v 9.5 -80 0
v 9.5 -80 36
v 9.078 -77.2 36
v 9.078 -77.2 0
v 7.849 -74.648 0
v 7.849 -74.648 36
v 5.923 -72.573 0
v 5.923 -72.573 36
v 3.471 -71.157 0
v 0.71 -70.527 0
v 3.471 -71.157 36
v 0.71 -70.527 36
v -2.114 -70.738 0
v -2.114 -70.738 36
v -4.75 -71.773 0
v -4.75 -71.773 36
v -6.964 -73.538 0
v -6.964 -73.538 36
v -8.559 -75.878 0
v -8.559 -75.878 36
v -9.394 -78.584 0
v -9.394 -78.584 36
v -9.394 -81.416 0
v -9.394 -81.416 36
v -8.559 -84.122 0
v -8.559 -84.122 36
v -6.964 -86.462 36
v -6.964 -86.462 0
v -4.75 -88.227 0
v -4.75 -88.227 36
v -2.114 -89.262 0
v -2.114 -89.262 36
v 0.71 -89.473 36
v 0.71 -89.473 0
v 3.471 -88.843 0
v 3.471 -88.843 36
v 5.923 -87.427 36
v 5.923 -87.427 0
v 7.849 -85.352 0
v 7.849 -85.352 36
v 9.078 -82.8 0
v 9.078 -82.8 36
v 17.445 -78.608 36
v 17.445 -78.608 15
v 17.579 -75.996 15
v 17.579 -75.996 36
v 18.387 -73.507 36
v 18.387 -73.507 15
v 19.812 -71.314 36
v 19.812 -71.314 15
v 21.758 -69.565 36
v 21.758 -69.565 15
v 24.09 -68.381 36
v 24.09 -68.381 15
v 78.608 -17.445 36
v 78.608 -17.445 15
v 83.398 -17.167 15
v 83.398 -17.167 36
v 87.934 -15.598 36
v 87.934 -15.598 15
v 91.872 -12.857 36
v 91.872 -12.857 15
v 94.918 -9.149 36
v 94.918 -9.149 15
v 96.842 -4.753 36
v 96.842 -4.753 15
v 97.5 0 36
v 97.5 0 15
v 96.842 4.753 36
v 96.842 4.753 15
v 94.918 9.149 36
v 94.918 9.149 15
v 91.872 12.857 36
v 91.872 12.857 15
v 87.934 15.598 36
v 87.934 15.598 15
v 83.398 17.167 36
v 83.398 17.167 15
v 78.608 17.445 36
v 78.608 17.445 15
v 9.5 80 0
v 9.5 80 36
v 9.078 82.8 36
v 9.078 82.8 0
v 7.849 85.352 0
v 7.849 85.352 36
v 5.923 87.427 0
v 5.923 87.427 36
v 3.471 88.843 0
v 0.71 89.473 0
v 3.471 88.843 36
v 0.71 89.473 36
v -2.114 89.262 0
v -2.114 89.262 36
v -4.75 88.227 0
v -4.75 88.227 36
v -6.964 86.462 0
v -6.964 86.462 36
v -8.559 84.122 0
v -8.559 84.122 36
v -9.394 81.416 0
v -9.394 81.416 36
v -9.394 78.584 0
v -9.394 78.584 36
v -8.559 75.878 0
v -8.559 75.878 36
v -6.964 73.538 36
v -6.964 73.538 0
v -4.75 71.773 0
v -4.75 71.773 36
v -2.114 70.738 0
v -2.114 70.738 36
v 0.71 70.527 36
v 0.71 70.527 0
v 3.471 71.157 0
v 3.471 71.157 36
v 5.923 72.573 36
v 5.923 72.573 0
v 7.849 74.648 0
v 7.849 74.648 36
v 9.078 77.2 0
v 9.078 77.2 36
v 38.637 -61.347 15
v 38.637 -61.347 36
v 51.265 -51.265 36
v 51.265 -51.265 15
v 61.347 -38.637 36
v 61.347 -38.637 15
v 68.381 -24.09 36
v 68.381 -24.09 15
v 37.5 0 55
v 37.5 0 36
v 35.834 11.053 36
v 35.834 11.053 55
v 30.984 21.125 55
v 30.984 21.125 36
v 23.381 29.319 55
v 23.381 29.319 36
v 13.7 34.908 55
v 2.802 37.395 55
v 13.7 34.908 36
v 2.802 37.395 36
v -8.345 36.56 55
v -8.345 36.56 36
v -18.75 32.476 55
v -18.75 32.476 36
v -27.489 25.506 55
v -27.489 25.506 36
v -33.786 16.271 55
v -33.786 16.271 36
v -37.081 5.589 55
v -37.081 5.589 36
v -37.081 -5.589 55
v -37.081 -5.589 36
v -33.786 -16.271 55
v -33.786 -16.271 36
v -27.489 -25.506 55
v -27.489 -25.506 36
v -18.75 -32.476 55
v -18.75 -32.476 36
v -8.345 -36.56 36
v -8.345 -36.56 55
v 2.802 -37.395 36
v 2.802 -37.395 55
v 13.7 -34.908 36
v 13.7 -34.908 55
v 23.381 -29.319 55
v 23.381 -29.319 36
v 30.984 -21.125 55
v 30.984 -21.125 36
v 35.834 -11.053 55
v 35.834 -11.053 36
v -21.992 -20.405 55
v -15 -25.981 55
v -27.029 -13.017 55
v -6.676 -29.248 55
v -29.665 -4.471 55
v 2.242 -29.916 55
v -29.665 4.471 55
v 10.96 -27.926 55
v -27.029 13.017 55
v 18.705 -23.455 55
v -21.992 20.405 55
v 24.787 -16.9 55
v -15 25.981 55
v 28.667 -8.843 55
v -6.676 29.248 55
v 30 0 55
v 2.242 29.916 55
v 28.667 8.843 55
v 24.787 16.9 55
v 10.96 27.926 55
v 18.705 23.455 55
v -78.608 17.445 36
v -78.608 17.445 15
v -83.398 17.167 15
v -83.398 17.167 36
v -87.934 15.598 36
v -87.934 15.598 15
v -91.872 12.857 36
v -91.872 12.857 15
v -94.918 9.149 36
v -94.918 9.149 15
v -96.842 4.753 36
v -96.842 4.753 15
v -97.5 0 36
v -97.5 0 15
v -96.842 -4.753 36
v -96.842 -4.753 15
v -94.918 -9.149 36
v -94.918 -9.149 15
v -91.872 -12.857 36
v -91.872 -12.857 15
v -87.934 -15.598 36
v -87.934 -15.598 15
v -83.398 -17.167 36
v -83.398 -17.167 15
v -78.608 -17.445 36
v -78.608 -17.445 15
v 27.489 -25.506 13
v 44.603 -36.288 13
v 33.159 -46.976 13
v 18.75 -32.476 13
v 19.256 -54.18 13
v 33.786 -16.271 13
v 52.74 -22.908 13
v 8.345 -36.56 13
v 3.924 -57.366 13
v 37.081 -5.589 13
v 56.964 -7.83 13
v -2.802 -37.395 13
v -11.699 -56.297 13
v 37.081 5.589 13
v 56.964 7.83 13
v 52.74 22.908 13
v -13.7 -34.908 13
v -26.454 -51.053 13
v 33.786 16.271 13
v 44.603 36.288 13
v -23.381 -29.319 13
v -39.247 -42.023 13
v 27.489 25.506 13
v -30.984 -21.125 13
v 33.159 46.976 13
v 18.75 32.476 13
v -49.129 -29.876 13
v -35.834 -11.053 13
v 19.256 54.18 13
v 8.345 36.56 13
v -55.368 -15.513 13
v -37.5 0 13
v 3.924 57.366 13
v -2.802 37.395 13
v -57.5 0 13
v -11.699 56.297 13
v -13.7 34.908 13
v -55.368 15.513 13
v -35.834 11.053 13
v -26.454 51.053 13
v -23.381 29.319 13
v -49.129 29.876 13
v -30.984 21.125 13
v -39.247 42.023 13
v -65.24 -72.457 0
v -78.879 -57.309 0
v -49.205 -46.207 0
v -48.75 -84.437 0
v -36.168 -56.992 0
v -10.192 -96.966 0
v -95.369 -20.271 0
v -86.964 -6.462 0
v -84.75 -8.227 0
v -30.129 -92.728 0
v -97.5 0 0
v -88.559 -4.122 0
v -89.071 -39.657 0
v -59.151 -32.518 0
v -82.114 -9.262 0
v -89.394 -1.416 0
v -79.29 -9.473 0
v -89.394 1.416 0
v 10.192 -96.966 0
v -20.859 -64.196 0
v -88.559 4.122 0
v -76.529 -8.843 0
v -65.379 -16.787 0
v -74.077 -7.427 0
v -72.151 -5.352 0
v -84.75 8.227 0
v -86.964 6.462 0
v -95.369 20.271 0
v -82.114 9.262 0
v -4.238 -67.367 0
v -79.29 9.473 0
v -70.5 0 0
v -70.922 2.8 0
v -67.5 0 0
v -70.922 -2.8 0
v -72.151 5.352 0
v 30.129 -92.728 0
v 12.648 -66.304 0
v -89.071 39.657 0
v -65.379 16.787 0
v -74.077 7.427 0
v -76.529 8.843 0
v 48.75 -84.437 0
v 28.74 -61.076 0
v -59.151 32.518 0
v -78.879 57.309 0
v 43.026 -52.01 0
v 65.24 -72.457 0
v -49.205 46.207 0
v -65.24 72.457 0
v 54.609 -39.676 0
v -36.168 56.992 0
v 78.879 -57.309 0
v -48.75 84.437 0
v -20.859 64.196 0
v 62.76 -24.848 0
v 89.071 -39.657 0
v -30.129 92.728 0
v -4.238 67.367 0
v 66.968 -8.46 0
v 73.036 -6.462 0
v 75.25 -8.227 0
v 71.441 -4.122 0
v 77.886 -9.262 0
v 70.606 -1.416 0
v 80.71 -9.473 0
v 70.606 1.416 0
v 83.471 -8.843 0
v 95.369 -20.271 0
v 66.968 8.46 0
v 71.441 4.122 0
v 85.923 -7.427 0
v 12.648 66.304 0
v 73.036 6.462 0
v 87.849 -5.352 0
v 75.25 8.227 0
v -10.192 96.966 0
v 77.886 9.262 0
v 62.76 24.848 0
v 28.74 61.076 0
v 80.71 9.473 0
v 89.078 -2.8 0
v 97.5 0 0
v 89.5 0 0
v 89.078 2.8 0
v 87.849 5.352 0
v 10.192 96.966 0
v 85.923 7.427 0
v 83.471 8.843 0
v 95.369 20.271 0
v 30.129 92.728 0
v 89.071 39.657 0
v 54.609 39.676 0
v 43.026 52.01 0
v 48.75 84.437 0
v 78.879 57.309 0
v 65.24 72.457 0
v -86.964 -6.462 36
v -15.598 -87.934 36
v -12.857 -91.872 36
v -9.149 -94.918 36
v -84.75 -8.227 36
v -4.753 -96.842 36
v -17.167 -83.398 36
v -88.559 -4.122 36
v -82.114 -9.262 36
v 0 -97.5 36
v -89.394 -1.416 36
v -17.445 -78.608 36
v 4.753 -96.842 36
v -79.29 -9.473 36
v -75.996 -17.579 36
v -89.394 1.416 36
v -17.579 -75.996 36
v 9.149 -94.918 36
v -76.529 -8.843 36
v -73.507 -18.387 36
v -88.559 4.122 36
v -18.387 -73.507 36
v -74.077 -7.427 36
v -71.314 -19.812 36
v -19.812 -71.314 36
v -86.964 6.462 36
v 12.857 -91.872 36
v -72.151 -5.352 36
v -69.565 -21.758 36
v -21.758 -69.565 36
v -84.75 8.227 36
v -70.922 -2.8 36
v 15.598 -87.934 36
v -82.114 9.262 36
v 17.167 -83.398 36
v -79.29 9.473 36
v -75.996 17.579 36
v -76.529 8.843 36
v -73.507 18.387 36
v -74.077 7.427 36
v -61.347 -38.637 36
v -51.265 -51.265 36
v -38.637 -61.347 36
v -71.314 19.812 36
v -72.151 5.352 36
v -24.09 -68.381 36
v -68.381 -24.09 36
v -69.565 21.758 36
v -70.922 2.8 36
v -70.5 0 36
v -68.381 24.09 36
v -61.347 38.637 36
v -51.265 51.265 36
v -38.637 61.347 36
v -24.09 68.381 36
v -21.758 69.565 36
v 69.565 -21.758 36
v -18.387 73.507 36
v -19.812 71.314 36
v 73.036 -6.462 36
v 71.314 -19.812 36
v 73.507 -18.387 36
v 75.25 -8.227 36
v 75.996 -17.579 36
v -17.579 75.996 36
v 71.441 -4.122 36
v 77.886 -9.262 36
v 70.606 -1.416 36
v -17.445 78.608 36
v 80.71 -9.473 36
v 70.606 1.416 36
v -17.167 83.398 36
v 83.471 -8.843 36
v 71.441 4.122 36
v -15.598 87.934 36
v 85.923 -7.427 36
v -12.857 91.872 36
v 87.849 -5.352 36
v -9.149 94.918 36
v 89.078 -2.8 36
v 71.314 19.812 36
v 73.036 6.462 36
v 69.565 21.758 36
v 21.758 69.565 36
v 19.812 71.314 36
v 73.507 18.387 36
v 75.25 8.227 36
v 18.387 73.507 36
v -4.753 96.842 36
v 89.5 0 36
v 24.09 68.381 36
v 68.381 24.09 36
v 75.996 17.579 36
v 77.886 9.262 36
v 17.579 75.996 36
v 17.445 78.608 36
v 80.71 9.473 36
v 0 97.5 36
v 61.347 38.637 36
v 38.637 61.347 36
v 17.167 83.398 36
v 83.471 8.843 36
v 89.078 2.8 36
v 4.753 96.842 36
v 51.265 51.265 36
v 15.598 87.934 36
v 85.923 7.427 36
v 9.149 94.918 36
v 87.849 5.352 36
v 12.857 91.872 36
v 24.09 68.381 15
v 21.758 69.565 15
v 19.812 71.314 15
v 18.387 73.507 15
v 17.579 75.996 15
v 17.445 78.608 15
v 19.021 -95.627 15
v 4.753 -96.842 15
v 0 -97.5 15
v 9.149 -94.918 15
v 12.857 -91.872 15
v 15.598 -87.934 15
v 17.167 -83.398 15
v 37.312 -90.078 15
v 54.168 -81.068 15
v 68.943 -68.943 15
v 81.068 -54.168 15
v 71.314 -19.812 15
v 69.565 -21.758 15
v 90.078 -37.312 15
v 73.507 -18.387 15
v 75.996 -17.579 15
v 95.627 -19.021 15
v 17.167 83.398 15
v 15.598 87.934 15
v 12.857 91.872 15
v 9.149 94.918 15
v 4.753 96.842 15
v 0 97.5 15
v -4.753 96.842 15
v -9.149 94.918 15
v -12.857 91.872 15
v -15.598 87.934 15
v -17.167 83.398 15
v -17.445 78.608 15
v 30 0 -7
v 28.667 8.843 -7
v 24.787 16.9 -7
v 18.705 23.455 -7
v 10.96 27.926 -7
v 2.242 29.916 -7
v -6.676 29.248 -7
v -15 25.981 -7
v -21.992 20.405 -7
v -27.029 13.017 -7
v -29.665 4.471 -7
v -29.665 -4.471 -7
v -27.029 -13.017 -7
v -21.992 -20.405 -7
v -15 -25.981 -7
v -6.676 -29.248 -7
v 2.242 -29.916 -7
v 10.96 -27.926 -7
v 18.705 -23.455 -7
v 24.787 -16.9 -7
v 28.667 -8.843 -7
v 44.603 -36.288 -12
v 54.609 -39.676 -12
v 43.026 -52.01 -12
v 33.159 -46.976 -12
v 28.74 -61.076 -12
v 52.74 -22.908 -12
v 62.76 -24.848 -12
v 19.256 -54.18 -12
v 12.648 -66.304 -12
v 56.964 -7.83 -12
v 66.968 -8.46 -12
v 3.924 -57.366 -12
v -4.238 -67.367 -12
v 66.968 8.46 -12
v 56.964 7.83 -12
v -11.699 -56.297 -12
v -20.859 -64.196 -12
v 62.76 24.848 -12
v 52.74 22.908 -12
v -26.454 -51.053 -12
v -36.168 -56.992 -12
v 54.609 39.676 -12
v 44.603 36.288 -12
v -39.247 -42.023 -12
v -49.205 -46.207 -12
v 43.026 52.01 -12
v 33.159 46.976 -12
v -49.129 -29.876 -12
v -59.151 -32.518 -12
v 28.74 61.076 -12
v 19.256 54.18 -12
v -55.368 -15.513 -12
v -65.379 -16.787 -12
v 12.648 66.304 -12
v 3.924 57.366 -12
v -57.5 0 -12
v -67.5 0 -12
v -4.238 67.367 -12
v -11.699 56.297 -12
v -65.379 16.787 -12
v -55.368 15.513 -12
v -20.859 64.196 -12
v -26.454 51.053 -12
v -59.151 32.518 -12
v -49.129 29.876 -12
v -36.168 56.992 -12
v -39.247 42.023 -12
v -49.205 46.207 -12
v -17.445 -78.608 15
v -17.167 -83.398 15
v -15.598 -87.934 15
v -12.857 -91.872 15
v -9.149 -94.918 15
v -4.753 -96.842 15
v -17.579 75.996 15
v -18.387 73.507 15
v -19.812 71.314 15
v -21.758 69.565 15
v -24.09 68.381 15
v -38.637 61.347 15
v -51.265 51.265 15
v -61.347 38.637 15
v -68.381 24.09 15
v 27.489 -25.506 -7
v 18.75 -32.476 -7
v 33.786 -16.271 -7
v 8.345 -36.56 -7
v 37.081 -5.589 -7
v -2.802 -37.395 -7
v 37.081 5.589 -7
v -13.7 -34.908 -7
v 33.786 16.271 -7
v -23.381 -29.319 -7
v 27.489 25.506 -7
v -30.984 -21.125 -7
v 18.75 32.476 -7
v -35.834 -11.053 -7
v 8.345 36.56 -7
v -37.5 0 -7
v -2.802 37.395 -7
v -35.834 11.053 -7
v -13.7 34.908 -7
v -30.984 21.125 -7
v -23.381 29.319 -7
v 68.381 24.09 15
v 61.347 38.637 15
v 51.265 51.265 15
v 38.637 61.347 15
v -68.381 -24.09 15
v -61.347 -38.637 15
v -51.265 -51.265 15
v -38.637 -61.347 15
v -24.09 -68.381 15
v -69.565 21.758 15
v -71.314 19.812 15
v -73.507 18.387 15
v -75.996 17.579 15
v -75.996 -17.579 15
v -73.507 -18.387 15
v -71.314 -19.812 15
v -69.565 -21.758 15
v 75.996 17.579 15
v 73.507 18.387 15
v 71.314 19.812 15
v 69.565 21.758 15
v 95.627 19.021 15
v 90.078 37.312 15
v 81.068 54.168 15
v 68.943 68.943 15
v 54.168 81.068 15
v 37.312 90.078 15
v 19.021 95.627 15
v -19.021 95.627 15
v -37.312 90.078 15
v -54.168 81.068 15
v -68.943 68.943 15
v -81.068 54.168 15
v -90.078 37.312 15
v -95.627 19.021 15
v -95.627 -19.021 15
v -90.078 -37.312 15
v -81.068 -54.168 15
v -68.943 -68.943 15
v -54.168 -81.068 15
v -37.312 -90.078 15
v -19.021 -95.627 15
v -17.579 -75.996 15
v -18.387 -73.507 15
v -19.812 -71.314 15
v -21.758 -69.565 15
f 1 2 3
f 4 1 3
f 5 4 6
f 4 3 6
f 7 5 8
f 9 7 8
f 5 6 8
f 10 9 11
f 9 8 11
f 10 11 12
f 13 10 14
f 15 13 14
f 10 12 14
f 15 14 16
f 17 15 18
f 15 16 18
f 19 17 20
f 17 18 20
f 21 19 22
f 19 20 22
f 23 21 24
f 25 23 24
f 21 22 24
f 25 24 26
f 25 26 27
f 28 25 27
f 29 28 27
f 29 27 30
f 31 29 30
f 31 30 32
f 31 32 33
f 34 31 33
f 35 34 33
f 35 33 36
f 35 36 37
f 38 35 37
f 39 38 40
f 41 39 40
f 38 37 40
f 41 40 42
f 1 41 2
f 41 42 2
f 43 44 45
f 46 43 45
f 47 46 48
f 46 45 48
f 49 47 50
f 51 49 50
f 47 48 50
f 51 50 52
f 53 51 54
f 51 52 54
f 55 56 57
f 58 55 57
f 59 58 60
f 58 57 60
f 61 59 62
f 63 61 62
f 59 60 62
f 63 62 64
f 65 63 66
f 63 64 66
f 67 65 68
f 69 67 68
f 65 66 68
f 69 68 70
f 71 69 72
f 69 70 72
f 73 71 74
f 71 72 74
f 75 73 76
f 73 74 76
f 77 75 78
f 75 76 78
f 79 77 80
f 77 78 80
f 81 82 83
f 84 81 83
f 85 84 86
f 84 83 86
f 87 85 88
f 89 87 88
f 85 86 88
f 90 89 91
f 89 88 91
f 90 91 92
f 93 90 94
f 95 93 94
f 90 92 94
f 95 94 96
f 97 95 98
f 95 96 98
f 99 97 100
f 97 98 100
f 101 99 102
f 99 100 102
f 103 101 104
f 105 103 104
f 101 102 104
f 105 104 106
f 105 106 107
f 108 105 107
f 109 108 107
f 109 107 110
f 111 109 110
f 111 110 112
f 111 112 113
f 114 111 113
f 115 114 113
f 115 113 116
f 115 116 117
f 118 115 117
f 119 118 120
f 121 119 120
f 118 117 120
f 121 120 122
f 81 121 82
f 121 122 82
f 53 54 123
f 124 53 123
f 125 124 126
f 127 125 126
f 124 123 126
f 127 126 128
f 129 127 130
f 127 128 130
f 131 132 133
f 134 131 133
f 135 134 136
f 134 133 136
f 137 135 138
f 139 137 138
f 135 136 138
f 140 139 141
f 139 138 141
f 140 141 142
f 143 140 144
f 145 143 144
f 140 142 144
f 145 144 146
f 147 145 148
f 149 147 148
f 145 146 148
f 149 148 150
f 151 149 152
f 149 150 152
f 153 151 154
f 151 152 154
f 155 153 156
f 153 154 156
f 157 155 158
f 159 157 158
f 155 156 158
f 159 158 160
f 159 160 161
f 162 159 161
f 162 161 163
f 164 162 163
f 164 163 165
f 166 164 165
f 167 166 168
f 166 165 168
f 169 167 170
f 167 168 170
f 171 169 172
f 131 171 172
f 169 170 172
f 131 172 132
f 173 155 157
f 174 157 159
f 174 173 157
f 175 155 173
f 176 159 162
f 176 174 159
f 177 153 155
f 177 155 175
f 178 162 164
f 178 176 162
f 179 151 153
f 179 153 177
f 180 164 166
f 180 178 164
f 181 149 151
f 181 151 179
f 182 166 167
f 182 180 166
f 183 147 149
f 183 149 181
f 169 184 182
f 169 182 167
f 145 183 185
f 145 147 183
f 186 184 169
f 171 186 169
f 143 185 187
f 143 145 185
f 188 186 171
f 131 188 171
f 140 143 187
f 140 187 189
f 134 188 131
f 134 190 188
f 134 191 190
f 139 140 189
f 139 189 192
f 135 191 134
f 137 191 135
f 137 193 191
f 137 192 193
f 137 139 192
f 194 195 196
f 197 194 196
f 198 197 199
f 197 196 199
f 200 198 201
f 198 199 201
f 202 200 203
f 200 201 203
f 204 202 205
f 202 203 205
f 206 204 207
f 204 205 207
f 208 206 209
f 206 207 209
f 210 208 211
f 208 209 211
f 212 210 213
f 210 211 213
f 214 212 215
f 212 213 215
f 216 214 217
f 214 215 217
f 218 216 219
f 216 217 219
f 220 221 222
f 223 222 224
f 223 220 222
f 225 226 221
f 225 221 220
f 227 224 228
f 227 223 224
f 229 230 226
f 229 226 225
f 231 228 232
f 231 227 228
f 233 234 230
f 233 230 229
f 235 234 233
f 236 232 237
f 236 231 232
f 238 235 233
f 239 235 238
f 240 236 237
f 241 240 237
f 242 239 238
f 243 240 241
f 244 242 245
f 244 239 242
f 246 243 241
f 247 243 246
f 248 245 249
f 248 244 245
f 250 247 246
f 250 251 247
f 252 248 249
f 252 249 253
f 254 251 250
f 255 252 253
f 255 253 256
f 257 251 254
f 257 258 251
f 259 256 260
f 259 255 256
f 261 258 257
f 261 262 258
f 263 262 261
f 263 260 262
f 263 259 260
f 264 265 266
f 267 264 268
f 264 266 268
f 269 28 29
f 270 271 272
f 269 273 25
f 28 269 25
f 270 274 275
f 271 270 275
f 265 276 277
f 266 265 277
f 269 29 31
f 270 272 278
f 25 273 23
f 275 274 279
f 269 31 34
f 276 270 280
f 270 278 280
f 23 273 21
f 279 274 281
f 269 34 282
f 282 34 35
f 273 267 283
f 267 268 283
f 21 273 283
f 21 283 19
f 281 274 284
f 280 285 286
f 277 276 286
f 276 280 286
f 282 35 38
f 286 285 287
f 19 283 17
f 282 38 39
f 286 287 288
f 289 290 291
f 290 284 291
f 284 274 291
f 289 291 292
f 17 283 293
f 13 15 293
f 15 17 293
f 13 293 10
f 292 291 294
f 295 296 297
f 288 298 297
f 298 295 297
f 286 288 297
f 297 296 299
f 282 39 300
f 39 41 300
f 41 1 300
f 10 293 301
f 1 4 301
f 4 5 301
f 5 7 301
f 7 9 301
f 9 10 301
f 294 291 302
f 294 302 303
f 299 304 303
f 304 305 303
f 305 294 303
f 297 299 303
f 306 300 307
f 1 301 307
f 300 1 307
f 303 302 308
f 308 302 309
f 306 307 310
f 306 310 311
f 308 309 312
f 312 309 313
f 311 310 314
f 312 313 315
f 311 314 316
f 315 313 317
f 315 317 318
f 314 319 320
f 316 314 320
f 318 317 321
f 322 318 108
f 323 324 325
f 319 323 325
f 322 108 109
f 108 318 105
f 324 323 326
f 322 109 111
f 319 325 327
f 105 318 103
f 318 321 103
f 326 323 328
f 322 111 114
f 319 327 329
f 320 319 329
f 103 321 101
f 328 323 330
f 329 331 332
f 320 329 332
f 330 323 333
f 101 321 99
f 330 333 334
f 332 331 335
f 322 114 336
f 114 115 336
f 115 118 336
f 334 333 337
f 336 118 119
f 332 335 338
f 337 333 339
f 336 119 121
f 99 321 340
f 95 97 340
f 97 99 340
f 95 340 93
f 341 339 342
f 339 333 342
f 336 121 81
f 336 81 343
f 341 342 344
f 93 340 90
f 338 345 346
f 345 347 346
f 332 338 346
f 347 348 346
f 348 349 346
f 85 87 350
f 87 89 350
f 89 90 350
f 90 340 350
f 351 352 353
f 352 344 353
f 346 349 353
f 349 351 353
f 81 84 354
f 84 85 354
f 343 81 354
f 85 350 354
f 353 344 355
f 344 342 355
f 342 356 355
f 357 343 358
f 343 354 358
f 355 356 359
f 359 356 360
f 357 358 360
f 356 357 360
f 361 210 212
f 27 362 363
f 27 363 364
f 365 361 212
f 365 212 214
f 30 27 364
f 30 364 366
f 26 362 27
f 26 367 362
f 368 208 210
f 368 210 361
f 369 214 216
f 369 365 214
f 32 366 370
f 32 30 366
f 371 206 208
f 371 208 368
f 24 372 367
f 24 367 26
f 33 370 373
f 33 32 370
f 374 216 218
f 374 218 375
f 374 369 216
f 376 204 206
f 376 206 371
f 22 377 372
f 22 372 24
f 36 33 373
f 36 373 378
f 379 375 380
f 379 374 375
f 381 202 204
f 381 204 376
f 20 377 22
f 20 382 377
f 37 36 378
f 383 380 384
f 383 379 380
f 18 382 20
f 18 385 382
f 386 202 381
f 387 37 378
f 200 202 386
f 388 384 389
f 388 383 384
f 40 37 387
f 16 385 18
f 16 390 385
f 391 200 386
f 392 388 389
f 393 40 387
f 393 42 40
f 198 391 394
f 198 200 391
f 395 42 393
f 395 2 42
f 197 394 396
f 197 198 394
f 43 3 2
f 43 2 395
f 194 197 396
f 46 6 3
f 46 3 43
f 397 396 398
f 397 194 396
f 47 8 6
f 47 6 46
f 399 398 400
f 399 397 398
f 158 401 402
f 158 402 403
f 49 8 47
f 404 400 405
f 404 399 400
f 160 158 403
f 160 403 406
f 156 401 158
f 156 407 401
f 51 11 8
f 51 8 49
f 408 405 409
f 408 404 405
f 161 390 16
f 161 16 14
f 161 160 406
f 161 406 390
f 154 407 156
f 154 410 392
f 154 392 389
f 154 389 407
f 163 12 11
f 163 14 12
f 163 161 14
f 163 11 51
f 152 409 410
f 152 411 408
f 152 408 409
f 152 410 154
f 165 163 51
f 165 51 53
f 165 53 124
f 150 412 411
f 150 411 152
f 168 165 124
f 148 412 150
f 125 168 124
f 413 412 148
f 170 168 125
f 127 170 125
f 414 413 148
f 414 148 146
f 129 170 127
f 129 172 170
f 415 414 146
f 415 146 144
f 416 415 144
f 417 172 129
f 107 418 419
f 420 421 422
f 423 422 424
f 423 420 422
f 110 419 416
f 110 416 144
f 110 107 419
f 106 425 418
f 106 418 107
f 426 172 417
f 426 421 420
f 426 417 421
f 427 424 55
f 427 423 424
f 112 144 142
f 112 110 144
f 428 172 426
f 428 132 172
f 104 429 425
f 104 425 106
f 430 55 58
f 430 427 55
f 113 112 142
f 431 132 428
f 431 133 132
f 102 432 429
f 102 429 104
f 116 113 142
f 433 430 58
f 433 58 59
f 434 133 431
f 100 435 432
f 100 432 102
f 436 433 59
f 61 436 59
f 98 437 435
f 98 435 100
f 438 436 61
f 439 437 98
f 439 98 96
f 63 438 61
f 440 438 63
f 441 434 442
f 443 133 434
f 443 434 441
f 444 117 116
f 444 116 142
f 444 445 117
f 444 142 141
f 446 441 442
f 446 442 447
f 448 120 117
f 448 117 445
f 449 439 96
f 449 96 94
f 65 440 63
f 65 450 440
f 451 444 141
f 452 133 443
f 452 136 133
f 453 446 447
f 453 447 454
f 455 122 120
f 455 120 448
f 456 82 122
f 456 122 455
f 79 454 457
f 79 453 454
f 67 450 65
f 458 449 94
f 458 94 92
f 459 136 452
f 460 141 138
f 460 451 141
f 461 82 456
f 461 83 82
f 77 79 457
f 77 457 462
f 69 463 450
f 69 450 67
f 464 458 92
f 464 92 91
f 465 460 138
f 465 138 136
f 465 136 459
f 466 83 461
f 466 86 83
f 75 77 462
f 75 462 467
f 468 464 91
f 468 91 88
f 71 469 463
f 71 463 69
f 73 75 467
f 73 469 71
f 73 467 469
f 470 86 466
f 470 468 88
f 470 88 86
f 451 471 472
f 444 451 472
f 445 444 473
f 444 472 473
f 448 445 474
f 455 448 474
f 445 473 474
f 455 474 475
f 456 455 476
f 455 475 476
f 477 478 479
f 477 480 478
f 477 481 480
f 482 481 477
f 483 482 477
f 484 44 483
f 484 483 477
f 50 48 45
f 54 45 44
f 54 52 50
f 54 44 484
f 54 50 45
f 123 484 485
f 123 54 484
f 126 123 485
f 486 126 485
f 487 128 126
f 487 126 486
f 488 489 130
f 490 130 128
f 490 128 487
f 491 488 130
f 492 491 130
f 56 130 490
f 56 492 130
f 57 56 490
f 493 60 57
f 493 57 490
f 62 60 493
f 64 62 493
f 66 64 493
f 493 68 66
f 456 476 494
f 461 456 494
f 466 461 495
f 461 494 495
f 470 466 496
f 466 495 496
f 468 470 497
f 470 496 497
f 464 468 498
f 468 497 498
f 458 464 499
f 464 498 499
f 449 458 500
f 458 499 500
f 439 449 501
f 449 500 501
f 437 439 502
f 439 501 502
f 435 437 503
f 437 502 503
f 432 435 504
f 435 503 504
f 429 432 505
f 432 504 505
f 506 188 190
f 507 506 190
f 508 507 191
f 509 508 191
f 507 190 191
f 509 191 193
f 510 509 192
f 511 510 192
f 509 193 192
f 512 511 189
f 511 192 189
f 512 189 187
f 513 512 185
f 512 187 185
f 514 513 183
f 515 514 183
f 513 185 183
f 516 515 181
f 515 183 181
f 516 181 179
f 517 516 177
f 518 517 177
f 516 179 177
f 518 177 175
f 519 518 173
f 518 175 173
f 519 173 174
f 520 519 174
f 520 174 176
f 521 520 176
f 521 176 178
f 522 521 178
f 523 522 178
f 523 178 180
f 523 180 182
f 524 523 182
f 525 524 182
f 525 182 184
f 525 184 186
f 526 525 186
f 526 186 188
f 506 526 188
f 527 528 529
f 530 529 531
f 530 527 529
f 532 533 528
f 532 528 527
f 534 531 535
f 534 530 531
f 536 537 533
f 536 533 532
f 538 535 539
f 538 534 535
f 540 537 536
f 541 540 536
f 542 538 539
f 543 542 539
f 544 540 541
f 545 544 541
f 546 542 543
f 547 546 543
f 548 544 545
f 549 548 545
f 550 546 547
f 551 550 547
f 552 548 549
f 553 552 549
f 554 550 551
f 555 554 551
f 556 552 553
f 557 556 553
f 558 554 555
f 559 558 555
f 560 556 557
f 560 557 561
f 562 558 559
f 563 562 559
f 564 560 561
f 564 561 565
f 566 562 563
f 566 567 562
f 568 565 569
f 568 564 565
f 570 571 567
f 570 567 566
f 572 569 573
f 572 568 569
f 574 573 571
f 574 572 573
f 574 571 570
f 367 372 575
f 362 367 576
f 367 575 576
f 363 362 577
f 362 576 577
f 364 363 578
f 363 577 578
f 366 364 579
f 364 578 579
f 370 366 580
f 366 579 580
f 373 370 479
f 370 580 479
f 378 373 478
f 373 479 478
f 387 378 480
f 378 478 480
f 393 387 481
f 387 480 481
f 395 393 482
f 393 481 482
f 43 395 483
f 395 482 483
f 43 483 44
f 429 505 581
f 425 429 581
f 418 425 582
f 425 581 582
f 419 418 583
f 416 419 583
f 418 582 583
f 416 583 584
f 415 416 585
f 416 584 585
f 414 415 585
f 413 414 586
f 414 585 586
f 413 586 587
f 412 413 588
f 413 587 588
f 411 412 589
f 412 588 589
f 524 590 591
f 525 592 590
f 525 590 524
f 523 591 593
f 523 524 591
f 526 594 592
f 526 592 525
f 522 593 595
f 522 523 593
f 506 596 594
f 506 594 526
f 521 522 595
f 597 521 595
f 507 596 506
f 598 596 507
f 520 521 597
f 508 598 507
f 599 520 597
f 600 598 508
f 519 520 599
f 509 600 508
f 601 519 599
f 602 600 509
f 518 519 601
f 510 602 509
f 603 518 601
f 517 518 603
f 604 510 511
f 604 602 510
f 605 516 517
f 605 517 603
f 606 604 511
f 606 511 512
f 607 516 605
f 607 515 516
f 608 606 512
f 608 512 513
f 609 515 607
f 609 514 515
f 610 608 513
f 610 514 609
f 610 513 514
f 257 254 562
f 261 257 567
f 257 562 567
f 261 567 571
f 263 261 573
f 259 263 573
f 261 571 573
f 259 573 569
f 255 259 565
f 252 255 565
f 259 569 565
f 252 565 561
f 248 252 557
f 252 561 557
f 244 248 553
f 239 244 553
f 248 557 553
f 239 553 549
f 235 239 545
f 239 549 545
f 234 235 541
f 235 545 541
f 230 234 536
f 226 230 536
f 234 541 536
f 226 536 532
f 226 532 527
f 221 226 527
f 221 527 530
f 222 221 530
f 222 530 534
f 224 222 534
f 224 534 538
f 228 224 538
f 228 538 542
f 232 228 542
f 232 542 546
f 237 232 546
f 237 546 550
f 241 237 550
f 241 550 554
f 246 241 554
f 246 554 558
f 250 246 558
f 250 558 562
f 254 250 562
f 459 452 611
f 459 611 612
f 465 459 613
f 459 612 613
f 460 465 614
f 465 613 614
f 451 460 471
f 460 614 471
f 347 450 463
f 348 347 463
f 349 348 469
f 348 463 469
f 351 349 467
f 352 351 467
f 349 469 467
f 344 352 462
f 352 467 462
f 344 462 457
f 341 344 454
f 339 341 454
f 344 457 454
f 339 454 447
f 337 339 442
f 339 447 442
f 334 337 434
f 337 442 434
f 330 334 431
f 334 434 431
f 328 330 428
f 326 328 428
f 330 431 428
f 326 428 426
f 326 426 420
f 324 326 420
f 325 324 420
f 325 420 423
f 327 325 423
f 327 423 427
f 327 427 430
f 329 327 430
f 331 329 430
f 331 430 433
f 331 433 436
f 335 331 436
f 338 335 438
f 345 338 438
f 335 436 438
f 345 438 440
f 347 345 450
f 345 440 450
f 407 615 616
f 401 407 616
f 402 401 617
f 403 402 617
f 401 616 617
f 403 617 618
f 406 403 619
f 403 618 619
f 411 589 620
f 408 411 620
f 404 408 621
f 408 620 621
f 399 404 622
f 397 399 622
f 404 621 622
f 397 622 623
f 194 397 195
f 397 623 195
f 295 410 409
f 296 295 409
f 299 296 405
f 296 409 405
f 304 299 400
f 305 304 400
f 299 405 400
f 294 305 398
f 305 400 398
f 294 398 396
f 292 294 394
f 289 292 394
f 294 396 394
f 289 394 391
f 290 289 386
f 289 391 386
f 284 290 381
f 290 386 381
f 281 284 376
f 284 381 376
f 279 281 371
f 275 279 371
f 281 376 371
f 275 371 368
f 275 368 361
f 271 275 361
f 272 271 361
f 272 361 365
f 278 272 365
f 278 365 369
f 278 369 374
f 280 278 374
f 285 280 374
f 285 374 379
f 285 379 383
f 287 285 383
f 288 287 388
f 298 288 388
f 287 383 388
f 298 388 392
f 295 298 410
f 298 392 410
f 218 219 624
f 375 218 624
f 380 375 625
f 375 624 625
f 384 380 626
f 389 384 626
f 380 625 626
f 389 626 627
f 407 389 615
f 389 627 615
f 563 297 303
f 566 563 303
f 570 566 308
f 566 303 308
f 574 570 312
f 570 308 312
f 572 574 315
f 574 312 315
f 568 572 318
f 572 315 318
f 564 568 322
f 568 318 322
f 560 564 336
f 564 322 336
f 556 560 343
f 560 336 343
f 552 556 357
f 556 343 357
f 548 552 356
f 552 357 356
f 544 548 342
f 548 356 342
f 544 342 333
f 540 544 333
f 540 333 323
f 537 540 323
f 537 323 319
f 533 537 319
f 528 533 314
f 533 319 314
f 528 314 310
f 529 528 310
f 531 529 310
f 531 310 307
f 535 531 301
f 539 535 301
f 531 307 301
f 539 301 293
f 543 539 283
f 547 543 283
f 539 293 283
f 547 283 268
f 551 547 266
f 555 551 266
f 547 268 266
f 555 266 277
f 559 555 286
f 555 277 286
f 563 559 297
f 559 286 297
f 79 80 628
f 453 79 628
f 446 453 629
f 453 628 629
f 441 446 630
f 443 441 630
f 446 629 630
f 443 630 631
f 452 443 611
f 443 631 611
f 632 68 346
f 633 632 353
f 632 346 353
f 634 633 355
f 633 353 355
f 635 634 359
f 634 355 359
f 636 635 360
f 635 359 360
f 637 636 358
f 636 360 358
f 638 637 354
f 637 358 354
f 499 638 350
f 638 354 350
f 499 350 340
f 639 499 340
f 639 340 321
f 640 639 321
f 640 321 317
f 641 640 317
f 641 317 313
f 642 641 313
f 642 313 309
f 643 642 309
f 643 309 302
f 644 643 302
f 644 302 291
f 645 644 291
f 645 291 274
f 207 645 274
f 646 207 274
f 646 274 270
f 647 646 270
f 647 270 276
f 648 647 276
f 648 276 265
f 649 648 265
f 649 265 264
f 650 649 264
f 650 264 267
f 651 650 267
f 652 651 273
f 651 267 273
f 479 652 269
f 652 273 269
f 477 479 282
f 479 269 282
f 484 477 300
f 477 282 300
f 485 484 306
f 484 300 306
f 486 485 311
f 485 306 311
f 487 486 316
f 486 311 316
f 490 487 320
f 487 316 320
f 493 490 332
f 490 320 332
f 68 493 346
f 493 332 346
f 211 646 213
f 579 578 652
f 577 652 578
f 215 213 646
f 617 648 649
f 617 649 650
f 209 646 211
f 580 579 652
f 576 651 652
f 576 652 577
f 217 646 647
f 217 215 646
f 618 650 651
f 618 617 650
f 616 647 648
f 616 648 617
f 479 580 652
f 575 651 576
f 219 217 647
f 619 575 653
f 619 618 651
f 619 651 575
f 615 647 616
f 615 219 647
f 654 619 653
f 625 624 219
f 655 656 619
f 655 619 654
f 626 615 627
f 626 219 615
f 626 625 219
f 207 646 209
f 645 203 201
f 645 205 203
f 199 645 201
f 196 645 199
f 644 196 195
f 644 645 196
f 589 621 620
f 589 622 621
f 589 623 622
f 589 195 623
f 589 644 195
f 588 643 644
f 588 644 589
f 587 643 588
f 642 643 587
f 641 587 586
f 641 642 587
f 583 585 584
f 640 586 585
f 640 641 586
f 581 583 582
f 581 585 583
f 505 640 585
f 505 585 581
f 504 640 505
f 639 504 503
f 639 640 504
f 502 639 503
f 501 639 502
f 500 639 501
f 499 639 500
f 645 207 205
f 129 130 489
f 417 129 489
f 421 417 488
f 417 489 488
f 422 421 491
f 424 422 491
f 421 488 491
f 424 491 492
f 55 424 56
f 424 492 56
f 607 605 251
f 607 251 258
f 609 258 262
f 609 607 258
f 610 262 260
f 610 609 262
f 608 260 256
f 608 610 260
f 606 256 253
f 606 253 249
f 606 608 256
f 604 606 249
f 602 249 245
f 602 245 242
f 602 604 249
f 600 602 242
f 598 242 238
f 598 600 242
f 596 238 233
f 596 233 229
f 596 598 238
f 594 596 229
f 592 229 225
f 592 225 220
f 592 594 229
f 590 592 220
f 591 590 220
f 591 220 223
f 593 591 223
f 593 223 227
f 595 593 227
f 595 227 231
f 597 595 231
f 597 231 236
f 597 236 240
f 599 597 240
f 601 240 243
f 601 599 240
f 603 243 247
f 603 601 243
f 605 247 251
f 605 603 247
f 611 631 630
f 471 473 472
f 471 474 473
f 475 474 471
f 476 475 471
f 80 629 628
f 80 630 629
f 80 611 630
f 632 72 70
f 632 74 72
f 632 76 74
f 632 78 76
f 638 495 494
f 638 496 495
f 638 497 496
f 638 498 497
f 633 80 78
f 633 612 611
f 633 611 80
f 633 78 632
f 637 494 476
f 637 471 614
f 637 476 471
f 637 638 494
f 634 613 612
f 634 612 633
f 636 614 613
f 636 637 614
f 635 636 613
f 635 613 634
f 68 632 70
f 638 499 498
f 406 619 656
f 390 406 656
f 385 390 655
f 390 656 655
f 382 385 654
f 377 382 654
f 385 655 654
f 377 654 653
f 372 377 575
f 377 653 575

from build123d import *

# Parameters (mm, degrees)
SKETCH_1_R          = 97.5
EXTRUDE_1_DEPTH     = 15
SKETCH_2_R          = 72.5
EXTRUDE_2_DEPTH     = 21
SKETCH_3_R          = 67.5
EXTRUDE_3_DEPTH     = 12
SKETCH_4_R          = 37.5
EXTRUDE_4_DEPTH     = 19
CUT_EXTRUDE_1_REACH = 69
SKETCH_5_R          = 30
SKETCH_6_R          = 57.5
CUT_EXTRUDE_2_DEPTH = 5
SKETCH_7_R          = 57.5
SKETCH_7_R_2        = 37.5
CUT_EXTRUDE_3_DEPTH = 20
EXTRUDE_5_DEPTH     = 21
SKETCH_9_R          = 9.5
CUT_EXTRUDE_4_DEPTH = 36


with BuildPart() as part:
    # 草图1 → 凸台-拉伸1 (new body)
    with BuildSketch(Plane.XY):
        Circle(SKETCH_1_R)
    extrude(amount=EXTRUDE_1_DEPTH)

    # 草图2 → 凸台-拉伸2 (add)
    with BuildSketch(Plane.XY.offset(15)):
        Circle(SKETCH_2_R)
    extrude(amount=EXTRUDE_2_DEPTH)

    # 草图3 → 凸台-拉伸3 (add)
    with BuildSketch(Plane(origin=(0, 0, 0), x_dir=(-1, 0, 0), z_dir=(0, 0, -1))):
        Circle(SKETCH_3_R)
    extrude(amount=EXTRUDE_3_DEPTH)

    # 草图4 → 凸台-拉伸4 (add)
    with BuildSketch(Plane.XY.offset(36)):
        Circle(SKETCH_4_R)
    extrude(amount=EXTRUDE_4_DEPTH)

    # 草图5 → 切除-拉伸1 (cut, up to next)
    with BuildSketch(Plane.XY.offset(55), mode=Mode.PRIVATE) as cut_extrude_1_sk1:
        Circle(SKETCH_5_R)
    cut_extrude_1_tool1 = extrude(cut_extrude_1_sk1.sketch, amount=-CUT_EXTRUDE_1_REACH, mode=Mode.PRIVATE) & part.part
    add(cut_extrude_1_tool1.solids().sort_by_distance((0, 0, 55))[0], mode=Mode.SUBTRACT)

    # 草图6 → 切除-拉伸2 (cut)
    with BuildSketch(Plane(origin=(0, 0, -12), x_dir=(-1, 0, 0), z_dir=(0, 0, -1))):
        Circle(SKETCH_6_R)
    extrude(amount=-CUT_EXTRUDE_2_DEPTH, mode=Mode.SUBTRACT)

    # 草图7 → 切除-拉伸3 (cut)
    with BuildSketch(Plane(origin=(0, 0, -7), x_dir=(-1, 0, 0), z_dir=(0, 0, -1))):
        Circle(SKETCH_7_R)
        Circle(SKETCH_7_R_2, mode=Mode.SUBTRACT)
    extrude(amount=-CUT_EXTRUDE_3_DEPTH, mode=Mode.SUBTRACT)

    # 草图8 → 凸台-拉伸5 (add)
    with BuildSketch(Plane.XY.offset(15)):
        with BuildLine():
            ThreePointArc((17.444546697, 78.607954545), (0, 97.5), (-17.444546697, 78.607954545))
            ThreePointArc((-17.444546697, 78.607954545), (-19.027604179, 72.363876321), (-24.090088295, 68.380681818))
            ThreePointArc((-24.090088295, 68.380681818), (0, 72.5), (24.090088295, 68.380681818))
            ThreePointArc((24.090088295, 68.380681818), (19.027604179, 72.363876321), (17.444546697, 78.607954545))
        make_face()
        with BuildLine():
            ThreePointArc((78.607954545, -17.444546697), (97.5, 0), (78.607954545, 17.444546697))
            ThreePointArc((78.607954545, 17.444546697), (72.363876321, 19.027604179), (68.380681818, 24.090088295))
            ThreePointArc((68.380681818, 24.090088295), (72.5, 0), (68.380681818, -24.090088295))
            ThreePointArc((68.380681818, -24.090088295), (72.363876321, -19.027604179), (78.607954545, -17.444546697))
        make_face()
        with BuildLine():
            ThreePointArc((-17.444546697, -78.607954545), (0, -97.5), (17.444546697, -78.607954545))
            ThreePointArc((17.444546697, -78.607954545), (19.027604179, -72.363876321), (24.090088295, -68.380681818))
            ThreePointArc((24.090088295, -68.380681818), (0, -72.5), (-24.090088295, -68.380681818))
            ThreePointArc((-24.090088295, -68.380681818), (-19.027604179, -72.363876321), (-17.444546697, -78.607954545))
        make_face()
        with BuildLine():
            ThreePointArc((-78.607954545, 17.444546697), (-97.5, 0), (-78.607954545, -17.444546697))
            ThreePointArc((-78.607954545, -17.444546697), (-72.363876321, -19.027604179), (-68.380681818, -24.090088295))
            ThreePointArc((-68.380681818, -24.090088295), (-72.5, 0), (-68.380681818, 24.090088295))
            ThreePointArc((-68.380681818, 24.090088295), (-72.363876321, 19.027604179), (-78.607954545, 17.444546697))
        make_face()
    extrude(amount=EXTRUDE_5_DEPTH)

    # 草图9 → 切除-拉伸4 (cut)
    with BuildSketch(Plane.XY.offset(36)):
        with Locations((0, 80)):
            Circle(SKETCH_9_R)
        with Locations((80, 0)):
            Circle(SKETCH_9_R)
        with Locations((0, -80)):
            Circle(SKETCH_9_R)
        with Locations((-80, 0)):
            Circle(SKETCH_9_R)
    extrude(amount=-CUT_EXTRUDE_4_DEPTH, mode=Mode.SUBTRACT)


solid = part.part
